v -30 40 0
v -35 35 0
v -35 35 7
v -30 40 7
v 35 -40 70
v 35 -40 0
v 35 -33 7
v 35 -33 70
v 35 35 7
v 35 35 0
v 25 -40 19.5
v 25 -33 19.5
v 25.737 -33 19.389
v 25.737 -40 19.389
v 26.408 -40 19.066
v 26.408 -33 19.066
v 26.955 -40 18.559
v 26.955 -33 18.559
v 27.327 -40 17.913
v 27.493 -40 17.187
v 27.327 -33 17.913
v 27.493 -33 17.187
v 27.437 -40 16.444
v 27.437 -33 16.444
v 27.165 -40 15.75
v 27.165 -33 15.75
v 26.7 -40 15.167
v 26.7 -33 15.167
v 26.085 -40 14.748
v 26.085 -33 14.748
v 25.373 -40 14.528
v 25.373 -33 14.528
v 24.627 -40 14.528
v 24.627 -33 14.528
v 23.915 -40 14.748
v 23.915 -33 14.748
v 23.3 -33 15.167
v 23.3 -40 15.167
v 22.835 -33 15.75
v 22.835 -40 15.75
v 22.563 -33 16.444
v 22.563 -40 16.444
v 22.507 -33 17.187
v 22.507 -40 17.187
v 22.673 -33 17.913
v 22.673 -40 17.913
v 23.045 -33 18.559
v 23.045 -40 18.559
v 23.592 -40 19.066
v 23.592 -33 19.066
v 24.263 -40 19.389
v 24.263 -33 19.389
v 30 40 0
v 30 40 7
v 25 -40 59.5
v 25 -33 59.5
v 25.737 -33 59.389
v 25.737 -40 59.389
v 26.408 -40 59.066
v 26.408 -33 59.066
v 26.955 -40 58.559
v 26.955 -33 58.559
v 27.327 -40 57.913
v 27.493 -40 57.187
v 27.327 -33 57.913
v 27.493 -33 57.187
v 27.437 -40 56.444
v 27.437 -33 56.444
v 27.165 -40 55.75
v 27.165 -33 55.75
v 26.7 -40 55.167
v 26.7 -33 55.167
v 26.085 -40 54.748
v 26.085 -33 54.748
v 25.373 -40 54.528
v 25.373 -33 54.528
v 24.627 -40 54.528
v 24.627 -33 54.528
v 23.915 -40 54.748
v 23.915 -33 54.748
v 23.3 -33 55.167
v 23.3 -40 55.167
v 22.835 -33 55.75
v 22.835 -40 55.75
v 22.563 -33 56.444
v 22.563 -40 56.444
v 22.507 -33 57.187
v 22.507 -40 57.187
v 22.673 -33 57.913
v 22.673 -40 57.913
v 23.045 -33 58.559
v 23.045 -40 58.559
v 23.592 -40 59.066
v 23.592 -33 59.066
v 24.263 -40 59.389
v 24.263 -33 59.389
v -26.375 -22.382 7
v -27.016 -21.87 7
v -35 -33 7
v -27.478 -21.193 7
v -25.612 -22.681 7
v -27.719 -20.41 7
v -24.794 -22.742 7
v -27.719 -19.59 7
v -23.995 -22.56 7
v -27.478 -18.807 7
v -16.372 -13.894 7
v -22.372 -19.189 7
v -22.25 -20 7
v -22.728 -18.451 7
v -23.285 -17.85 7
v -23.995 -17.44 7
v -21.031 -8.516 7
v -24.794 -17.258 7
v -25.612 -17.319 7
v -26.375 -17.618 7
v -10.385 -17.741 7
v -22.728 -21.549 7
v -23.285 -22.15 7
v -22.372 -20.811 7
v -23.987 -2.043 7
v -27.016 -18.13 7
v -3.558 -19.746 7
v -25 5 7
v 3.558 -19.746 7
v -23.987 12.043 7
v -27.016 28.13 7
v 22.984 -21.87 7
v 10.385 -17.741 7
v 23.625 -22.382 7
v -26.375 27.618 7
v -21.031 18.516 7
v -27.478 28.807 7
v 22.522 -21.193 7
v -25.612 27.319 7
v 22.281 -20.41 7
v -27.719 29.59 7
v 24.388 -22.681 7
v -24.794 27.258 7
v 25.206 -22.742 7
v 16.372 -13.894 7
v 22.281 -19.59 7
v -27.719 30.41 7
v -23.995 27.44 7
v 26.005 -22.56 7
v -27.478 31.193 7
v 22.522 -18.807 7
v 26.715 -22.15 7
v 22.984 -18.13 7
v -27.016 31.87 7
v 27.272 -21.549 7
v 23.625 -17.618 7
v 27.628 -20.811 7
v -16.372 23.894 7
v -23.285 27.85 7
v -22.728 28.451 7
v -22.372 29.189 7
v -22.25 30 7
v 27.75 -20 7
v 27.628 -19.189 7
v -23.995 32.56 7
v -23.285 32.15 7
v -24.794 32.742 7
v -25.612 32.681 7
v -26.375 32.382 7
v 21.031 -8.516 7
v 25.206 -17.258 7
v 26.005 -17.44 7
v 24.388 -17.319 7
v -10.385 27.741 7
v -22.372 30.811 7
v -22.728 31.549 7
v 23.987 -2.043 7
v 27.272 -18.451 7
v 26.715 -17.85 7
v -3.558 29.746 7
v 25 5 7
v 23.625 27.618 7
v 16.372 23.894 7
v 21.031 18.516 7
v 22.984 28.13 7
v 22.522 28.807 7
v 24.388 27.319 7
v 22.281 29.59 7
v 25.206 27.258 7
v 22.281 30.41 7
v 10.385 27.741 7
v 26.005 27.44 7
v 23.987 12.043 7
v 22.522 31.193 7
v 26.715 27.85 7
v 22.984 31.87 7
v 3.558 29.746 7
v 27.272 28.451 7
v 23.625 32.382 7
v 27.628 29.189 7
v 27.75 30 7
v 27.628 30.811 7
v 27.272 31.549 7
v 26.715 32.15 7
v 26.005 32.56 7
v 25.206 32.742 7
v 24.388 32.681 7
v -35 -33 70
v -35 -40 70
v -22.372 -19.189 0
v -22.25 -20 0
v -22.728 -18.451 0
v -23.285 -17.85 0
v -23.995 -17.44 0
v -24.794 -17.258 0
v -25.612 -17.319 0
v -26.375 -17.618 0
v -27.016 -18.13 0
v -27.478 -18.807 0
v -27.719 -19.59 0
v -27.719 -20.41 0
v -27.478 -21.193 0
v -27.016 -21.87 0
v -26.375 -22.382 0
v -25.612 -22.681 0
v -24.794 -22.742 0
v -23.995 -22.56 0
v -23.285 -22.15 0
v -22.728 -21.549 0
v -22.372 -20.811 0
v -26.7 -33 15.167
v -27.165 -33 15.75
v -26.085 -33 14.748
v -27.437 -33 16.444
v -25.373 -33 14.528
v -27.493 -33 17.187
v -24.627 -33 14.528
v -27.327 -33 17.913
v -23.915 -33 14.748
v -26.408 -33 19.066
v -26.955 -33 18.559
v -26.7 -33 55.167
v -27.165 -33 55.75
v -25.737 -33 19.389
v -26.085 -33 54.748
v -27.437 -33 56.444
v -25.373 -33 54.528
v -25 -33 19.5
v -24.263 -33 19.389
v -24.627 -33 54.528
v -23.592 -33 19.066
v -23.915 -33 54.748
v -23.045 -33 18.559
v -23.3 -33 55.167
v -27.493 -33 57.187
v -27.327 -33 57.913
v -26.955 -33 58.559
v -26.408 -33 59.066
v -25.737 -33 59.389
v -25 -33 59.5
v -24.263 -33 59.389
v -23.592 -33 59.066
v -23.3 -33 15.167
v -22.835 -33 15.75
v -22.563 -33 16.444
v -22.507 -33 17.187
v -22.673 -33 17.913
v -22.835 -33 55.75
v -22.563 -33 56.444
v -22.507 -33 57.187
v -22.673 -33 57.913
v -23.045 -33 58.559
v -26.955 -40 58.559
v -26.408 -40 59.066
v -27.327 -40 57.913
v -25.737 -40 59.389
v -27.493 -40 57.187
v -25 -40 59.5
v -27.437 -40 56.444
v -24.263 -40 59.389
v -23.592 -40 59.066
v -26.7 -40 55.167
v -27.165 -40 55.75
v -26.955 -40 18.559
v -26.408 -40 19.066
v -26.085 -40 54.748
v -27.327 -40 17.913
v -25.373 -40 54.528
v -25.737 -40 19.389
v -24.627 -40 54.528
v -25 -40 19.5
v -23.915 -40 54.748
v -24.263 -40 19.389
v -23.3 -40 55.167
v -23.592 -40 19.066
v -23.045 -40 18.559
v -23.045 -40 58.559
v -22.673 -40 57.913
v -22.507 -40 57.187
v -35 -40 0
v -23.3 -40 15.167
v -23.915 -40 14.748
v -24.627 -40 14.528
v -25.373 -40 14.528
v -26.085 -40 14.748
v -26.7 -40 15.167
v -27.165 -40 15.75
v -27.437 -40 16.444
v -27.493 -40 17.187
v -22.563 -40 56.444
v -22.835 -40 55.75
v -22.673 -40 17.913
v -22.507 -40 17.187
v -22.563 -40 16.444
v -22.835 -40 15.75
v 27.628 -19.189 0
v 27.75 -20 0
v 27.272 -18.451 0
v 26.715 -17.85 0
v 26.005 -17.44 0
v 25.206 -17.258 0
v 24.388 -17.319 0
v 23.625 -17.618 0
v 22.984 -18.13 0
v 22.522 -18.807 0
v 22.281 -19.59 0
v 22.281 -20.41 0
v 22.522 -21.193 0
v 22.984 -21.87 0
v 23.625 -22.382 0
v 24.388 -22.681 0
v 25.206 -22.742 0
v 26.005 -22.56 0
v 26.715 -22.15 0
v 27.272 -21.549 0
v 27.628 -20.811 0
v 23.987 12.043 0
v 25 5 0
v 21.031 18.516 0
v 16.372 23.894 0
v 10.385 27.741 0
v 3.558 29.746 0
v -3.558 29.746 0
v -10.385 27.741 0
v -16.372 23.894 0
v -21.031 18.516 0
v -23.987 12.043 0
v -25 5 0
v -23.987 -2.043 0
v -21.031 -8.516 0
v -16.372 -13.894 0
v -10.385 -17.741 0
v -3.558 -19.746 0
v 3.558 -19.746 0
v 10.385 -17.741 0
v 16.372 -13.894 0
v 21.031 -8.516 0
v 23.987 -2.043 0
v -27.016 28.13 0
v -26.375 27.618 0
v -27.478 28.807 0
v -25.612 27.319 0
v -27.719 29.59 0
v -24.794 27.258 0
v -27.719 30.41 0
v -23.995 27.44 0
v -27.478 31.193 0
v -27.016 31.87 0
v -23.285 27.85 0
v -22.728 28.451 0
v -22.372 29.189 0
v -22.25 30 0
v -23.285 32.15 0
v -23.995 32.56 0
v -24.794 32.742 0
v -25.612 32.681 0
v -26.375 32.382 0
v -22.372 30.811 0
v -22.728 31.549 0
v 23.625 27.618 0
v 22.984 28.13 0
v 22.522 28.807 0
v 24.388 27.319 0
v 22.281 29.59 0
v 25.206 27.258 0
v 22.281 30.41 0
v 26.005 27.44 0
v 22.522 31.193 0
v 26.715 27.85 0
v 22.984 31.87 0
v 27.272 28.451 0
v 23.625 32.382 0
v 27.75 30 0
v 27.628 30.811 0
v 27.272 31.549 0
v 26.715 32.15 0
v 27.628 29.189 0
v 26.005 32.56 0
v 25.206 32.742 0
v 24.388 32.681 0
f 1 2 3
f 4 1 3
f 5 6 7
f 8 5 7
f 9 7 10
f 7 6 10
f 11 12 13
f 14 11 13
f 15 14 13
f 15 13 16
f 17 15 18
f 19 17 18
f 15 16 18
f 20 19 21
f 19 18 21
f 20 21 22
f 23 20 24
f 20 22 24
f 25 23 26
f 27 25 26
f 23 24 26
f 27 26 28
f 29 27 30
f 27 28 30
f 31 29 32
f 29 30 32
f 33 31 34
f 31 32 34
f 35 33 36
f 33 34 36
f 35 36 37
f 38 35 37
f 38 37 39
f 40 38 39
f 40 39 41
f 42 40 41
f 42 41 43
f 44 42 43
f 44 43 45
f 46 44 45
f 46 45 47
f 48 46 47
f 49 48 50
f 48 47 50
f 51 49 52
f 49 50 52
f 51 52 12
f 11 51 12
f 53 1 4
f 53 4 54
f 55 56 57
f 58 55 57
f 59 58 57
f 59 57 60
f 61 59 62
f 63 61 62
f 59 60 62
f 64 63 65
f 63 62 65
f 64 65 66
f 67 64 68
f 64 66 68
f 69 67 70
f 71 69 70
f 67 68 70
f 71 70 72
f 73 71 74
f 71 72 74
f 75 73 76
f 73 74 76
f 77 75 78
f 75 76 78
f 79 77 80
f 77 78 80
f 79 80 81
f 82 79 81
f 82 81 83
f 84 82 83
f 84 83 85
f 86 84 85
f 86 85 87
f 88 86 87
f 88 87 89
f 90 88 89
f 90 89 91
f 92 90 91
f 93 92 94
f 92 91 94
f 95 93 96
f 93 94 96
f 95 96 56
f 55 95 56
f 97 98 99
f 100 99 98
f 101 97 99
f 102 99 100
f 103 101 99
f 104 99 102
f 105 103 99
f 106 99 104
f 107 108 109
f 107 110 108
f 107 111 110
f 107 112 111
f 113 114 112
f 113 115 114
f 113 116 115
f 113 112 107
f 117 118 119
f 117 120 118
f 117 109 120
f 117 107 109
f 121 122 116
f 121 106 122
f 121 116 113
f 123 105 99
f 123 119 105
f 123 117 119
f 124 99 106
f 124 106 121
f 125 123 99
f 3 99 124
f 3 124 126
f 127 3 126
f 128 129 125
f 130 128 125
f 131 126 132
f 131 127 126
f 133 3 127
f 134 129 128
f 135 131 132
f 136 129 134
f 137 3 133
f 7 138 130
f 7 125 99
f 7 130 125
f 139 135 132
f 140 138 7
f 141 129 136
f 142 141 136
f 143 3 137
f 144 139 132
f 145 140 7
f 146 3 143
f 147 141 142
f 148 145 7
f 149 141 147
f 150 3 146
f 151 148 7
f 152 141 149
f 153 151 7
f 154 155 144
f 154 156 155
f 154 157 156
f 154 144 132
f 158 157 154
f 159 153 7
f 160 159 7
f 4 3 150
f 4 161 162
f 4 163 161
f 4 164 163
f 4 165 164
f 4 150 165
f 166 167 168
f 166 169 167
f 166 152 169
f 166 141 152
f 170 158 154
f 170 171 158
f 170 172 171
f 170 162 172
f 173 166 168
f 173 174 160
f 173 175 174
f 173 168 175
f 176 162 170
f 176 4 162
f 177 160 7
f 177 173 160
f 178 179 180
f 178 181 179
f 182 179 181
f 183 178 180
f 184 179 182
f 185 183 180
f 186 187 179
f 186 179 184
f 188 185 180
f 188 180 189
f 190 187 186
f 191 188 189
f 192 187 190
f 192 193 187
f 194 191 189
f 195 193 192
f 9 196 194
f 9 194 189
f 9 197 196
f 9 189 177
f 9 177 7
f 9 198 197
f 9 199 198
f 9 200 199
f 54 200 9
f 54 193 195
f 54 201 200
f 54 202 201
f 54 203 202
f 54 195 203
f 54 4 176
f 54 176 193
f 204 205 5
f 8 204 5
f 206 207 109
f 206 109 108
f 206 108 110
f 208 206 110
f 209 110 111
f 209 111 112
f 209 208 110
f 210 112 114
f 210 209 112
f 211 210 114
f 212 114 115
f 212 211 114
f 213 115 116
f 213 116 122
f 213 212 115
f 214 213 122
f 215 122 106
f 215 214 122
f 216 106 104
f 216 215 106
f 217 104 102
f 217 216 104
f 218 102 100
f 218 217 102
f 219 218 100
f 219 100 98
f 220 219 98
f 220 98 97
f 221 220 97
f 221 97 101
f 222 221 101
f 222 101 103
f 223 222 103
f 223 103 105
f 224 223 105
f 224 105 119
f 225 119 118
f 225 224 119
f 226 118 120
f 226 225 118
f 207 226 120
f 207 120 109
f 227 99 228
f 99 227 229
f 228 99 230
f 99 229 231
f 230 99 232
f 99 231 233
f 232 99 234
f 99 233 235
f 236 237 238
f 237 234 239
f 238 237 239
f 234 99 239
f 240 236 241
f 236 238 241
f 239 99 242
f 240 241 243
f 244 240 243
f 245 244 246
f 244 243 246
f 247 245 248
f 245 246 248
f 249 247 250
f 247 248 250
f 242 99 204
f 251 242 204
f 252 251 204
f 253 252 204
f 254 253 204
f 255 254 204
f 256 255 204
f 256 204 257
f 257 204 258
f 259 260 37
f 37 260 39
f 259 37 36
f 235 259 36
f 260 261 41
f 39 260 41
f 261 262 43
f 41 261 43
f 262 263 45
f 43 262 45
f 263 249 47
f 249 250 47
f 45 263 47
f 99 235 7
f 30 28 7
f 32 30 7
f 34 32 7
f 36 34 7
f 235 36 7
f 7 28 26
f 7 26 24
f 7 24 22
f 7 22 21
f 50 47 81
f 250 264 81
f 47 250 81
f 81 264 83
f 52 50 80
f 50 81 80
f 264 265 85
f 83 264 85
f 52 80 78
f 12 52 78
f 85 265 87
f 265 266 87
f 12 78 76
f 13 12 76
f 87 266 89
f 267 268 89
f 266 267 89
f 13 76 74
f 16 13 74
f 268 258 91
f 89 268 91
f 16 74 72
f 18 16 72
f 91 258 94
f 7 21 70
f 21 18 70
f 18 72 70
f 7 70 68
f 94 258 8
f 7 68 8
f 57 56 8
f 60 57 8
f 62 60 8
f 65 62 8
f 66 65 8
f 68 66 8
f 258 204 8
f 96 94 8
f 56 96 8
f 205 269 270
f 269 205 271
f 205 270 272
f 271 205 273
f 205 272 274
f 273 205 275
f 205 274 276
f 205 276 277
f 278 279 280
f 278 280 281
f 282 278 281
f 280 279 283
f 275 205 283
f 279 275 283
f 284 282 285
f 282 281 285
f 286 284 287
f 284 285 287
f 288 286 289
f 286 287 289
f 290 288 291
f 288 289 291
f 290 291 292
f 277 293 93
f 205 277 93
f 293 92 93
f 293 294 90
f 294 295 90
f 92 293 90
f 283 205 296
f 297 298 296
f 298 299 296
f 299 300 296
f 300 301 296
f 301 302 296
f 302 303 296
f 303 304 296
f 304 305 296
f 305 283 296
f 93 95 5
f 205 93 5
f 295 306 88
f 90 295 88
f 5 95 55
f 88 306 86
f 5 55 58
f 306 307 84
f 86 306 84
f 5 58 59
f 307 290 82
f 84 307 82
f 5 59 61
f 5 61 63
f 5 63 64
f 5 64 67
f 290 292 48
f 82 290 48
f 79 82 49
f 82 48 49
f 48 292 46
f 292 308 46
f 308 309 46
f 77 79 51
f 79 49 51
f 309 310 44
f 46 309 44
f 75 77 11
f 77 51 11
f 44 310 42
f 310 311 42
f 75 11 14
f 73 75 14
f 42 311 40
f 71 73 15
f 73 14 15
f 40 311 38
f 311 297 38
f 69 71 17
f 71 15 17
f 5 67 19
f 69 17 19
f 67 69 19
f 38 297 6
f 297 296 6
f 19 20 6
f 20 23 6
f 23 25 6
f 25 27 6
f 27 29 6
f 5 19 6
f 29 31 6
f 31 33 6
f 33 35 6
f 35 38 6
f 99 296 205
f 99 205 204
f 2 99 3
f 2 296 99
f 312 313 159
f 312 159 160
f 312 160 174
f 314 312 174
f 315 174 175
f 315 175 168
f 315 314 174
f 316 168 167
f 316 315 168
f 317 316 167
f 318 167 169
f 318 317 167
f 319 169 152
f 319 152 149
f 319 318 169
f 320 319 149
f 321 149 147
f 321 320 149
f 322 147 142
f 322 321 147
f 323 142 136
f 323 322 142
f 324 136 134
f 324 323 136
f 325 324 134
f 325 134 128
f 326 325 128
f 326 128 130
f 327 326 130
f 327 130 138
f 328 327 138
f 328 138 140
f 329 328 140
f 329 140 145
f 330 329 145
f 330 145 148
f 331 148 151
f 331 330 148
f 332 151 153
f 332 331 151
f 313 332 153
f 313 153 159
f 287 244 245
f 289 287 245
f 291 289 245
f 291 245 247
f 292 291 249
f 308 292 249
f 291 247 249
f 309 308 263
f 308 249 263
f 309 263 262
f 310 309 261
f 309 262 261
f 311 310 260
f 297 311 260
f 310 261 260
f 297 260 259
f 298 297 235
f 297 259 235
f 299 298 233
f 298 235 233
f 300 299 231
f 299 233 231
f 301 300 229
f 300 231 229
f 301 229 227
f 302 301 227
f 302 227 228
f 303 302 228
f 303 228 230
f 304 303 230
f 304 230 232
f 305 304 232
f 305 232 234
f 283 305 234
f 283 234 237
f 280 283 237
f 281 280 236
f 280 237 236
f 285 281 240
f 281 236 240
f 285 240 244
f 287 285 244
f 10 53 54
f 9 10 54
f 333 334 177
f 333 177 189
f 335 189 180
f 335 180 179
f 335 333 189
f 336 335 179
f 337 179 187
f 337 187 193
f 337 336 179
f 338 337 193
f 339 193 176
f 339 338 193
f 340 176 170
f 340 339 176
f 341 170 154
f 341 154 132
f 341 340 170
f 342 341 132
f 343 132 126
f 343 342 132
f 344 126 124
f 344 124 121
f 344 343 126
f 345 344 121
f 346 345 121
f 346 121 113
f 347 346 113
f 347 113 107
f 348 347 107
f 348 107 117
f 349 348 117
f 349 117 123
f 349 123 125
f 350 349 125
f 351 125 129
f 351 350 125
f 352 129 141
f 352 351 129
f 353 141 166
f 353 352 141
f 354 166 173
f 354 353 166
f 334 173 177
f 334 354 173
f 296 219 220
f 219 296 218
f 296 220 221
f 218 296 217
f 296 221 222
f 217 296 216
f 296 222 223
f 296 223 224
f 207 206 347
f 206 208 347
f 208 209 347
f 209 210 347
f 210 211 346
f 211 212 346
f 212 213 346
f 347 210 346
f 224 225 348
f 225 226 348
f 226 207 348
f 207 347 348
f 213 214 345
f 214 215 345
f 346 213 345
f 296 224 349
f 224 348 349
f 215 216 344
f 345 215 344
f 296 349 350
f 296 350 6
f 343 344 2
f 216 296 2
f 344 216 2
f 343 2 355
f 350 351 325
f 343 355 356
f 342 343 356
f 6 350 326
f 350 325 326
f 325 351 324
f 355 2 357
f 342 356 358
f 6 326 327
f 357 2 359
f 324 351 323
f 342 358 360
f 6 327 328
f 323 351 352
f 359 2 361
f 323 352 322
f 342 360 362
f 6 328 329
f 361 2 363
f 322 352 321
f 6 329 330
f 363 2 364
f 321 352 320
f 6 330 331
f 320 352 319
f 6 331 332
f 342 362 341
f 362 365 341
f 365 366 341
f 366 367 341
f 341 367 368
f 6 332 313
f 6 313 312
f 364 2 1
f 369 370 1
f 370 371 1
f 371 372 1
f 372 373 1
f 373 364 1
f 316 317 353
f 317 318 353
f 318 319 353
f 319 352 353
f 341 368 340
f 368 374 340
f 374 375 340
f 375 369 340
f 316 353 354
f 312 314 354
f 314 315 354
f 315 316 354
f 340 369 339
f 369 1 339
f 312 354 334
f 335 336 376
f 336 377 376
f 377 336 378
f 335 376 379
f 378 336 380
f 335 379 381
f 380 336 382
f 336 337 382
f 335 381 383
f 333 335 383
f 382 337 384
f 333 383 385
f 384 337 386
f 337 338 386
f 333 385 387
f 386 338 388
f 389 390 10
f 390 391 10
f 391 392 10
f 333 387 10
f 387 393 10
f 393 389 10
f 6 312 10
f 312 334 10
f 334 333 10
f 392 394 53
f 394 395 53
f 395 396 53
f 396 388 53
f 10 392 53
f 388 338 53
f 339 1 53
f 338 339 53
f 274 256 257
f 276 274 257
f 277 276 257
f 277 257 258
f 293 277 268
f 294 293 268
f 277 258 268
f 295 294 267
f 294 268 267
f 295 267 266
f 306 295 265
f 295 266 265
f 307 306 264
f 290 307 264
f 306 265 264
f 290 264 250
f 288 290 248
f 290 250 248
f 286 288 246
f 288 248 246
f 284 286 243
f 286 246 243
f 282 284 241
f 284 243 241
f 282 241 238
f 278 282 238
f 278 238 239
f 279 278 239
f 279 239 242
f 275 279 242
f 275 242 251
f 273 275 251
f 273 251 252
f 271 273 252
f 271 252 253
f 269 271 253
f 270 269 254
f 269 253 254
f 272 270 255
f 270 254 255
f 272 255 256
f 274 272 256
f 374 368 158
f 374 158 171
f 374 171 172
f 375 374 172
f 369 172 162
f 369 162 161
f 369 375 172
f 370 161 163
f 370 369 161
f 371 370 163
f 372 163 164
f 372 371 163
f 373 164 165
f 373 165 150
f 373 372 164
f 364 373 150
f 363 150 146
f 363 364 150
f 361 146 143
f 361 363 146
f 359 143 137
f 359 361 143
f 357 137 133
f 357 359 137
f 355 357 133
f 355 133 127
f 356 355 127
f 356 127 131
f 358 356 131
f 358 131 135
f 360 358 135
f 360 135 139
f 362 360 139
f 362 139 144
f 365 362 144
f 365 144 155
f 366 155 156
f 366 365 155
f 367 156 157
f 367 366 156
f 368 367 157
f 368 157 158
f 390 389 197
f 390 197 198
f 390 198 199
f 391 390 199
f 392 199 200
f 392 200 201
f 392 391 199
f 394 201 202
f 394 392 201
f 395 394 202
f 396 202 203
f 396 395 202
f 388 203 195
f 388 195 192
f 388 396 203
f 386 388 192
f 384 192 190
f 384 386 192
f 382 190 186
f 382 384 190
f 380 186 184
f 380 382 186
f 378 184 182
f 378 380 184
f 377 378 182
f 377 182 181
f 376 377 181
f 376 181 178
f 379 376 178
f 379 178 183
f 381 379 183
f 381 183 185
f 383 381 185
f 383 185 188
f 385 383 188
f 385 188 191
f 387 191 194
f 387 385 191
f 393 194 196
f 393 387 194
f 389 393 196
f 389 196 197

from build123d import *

# Parameters (mm, degrees)
SKETCH1_W           = 70
SKETCH1_H           = 80
SKETCH1_R           = 2.75
SKETCH1_R_2         = 25
BOSS_EXTRUDE1_DEPTH = 7
SKETCH2_W           = 70
SKETCH2_H           = 70
BOSS_EXTRUDE2_DEPTH = 7
SKETCH3_R           = 2.5
CUT_EXTRUDE1_DEPTH  = 7
CHAMFER1_SIZE       = 5


with BuildPart() as part:
    # Sketch1 → Boss-Extrude1 (new body)
    with BuildSketch(Plane.XY):
        Rectangle(SKETCH1_W, SKETCH1_H)
        with Locations((-25, 30)):
            Circle(SKETCH1_R, mode=Mode.SUBTRACT)
        with Locations((25, 30)):
            Circle(SKETCH1_R, mode=Mode.SUBTRACT)
        with Locations((-25, -20)):
            Circle(SKETCH1_R, mode=Mode.SUBTRACT)
        with Locations((25, -20)):
            Circle(SKETCH1_R, mode=Mode.SUBTRACT)
        with Locations((0, 5)):
            Circle(SKETCH1_R_2, mode=Mode.SUBTRACT)
    extrude(amount=BOSS_EXTRUDE1_DEPTH)

    # Sketch2 → Boss-Extrude2 (add)
    with BuildSketch(Plane.XZ.offset(40)):
        with Locations((0, 35)):
            Rectangle(SKETCH2_W, SKETCH2_H)
    extrude(amount=-BOSS_EXTRUDE2_DEPTH)

    # Sketch3 → Cut-Extrude1 (cut)
    with BuildSketch(Plane(origin=(0, -33, 0), x_dir=(1, 0, 0), z_dir=(0, 1, 0))):
        with Locations(Location((-25, -17, 0), (0, 0, 270))):
            Circle(SKETCH3_R)
        with Locations(Location((25, -17, 0), (0, 0, 270))):
            Circle(SKETCH3_R)
        with Locations(Location((-25, -57, 0), (0, 0, 270))):
            Circle(SKETCH3_R)
        with Locations(Location((25, -57, 0), (0, 0, 270))):
            Circle(SKETCH3_R)
    extrude(amount=-CUT_EXTRUDE1_DEPTH, mode=Mode.SUBTRACT)

    # Chamfer1
    chamfer1_edges = [part.edges().sort_by_distance(p)[0] for p in [
        (-35, 40, 3.5),
        (35, 40, 3.5),
    ]]
    chamfer(chamfer1_edges, length=CHAMFER1_SIZE)


solid = part.part
